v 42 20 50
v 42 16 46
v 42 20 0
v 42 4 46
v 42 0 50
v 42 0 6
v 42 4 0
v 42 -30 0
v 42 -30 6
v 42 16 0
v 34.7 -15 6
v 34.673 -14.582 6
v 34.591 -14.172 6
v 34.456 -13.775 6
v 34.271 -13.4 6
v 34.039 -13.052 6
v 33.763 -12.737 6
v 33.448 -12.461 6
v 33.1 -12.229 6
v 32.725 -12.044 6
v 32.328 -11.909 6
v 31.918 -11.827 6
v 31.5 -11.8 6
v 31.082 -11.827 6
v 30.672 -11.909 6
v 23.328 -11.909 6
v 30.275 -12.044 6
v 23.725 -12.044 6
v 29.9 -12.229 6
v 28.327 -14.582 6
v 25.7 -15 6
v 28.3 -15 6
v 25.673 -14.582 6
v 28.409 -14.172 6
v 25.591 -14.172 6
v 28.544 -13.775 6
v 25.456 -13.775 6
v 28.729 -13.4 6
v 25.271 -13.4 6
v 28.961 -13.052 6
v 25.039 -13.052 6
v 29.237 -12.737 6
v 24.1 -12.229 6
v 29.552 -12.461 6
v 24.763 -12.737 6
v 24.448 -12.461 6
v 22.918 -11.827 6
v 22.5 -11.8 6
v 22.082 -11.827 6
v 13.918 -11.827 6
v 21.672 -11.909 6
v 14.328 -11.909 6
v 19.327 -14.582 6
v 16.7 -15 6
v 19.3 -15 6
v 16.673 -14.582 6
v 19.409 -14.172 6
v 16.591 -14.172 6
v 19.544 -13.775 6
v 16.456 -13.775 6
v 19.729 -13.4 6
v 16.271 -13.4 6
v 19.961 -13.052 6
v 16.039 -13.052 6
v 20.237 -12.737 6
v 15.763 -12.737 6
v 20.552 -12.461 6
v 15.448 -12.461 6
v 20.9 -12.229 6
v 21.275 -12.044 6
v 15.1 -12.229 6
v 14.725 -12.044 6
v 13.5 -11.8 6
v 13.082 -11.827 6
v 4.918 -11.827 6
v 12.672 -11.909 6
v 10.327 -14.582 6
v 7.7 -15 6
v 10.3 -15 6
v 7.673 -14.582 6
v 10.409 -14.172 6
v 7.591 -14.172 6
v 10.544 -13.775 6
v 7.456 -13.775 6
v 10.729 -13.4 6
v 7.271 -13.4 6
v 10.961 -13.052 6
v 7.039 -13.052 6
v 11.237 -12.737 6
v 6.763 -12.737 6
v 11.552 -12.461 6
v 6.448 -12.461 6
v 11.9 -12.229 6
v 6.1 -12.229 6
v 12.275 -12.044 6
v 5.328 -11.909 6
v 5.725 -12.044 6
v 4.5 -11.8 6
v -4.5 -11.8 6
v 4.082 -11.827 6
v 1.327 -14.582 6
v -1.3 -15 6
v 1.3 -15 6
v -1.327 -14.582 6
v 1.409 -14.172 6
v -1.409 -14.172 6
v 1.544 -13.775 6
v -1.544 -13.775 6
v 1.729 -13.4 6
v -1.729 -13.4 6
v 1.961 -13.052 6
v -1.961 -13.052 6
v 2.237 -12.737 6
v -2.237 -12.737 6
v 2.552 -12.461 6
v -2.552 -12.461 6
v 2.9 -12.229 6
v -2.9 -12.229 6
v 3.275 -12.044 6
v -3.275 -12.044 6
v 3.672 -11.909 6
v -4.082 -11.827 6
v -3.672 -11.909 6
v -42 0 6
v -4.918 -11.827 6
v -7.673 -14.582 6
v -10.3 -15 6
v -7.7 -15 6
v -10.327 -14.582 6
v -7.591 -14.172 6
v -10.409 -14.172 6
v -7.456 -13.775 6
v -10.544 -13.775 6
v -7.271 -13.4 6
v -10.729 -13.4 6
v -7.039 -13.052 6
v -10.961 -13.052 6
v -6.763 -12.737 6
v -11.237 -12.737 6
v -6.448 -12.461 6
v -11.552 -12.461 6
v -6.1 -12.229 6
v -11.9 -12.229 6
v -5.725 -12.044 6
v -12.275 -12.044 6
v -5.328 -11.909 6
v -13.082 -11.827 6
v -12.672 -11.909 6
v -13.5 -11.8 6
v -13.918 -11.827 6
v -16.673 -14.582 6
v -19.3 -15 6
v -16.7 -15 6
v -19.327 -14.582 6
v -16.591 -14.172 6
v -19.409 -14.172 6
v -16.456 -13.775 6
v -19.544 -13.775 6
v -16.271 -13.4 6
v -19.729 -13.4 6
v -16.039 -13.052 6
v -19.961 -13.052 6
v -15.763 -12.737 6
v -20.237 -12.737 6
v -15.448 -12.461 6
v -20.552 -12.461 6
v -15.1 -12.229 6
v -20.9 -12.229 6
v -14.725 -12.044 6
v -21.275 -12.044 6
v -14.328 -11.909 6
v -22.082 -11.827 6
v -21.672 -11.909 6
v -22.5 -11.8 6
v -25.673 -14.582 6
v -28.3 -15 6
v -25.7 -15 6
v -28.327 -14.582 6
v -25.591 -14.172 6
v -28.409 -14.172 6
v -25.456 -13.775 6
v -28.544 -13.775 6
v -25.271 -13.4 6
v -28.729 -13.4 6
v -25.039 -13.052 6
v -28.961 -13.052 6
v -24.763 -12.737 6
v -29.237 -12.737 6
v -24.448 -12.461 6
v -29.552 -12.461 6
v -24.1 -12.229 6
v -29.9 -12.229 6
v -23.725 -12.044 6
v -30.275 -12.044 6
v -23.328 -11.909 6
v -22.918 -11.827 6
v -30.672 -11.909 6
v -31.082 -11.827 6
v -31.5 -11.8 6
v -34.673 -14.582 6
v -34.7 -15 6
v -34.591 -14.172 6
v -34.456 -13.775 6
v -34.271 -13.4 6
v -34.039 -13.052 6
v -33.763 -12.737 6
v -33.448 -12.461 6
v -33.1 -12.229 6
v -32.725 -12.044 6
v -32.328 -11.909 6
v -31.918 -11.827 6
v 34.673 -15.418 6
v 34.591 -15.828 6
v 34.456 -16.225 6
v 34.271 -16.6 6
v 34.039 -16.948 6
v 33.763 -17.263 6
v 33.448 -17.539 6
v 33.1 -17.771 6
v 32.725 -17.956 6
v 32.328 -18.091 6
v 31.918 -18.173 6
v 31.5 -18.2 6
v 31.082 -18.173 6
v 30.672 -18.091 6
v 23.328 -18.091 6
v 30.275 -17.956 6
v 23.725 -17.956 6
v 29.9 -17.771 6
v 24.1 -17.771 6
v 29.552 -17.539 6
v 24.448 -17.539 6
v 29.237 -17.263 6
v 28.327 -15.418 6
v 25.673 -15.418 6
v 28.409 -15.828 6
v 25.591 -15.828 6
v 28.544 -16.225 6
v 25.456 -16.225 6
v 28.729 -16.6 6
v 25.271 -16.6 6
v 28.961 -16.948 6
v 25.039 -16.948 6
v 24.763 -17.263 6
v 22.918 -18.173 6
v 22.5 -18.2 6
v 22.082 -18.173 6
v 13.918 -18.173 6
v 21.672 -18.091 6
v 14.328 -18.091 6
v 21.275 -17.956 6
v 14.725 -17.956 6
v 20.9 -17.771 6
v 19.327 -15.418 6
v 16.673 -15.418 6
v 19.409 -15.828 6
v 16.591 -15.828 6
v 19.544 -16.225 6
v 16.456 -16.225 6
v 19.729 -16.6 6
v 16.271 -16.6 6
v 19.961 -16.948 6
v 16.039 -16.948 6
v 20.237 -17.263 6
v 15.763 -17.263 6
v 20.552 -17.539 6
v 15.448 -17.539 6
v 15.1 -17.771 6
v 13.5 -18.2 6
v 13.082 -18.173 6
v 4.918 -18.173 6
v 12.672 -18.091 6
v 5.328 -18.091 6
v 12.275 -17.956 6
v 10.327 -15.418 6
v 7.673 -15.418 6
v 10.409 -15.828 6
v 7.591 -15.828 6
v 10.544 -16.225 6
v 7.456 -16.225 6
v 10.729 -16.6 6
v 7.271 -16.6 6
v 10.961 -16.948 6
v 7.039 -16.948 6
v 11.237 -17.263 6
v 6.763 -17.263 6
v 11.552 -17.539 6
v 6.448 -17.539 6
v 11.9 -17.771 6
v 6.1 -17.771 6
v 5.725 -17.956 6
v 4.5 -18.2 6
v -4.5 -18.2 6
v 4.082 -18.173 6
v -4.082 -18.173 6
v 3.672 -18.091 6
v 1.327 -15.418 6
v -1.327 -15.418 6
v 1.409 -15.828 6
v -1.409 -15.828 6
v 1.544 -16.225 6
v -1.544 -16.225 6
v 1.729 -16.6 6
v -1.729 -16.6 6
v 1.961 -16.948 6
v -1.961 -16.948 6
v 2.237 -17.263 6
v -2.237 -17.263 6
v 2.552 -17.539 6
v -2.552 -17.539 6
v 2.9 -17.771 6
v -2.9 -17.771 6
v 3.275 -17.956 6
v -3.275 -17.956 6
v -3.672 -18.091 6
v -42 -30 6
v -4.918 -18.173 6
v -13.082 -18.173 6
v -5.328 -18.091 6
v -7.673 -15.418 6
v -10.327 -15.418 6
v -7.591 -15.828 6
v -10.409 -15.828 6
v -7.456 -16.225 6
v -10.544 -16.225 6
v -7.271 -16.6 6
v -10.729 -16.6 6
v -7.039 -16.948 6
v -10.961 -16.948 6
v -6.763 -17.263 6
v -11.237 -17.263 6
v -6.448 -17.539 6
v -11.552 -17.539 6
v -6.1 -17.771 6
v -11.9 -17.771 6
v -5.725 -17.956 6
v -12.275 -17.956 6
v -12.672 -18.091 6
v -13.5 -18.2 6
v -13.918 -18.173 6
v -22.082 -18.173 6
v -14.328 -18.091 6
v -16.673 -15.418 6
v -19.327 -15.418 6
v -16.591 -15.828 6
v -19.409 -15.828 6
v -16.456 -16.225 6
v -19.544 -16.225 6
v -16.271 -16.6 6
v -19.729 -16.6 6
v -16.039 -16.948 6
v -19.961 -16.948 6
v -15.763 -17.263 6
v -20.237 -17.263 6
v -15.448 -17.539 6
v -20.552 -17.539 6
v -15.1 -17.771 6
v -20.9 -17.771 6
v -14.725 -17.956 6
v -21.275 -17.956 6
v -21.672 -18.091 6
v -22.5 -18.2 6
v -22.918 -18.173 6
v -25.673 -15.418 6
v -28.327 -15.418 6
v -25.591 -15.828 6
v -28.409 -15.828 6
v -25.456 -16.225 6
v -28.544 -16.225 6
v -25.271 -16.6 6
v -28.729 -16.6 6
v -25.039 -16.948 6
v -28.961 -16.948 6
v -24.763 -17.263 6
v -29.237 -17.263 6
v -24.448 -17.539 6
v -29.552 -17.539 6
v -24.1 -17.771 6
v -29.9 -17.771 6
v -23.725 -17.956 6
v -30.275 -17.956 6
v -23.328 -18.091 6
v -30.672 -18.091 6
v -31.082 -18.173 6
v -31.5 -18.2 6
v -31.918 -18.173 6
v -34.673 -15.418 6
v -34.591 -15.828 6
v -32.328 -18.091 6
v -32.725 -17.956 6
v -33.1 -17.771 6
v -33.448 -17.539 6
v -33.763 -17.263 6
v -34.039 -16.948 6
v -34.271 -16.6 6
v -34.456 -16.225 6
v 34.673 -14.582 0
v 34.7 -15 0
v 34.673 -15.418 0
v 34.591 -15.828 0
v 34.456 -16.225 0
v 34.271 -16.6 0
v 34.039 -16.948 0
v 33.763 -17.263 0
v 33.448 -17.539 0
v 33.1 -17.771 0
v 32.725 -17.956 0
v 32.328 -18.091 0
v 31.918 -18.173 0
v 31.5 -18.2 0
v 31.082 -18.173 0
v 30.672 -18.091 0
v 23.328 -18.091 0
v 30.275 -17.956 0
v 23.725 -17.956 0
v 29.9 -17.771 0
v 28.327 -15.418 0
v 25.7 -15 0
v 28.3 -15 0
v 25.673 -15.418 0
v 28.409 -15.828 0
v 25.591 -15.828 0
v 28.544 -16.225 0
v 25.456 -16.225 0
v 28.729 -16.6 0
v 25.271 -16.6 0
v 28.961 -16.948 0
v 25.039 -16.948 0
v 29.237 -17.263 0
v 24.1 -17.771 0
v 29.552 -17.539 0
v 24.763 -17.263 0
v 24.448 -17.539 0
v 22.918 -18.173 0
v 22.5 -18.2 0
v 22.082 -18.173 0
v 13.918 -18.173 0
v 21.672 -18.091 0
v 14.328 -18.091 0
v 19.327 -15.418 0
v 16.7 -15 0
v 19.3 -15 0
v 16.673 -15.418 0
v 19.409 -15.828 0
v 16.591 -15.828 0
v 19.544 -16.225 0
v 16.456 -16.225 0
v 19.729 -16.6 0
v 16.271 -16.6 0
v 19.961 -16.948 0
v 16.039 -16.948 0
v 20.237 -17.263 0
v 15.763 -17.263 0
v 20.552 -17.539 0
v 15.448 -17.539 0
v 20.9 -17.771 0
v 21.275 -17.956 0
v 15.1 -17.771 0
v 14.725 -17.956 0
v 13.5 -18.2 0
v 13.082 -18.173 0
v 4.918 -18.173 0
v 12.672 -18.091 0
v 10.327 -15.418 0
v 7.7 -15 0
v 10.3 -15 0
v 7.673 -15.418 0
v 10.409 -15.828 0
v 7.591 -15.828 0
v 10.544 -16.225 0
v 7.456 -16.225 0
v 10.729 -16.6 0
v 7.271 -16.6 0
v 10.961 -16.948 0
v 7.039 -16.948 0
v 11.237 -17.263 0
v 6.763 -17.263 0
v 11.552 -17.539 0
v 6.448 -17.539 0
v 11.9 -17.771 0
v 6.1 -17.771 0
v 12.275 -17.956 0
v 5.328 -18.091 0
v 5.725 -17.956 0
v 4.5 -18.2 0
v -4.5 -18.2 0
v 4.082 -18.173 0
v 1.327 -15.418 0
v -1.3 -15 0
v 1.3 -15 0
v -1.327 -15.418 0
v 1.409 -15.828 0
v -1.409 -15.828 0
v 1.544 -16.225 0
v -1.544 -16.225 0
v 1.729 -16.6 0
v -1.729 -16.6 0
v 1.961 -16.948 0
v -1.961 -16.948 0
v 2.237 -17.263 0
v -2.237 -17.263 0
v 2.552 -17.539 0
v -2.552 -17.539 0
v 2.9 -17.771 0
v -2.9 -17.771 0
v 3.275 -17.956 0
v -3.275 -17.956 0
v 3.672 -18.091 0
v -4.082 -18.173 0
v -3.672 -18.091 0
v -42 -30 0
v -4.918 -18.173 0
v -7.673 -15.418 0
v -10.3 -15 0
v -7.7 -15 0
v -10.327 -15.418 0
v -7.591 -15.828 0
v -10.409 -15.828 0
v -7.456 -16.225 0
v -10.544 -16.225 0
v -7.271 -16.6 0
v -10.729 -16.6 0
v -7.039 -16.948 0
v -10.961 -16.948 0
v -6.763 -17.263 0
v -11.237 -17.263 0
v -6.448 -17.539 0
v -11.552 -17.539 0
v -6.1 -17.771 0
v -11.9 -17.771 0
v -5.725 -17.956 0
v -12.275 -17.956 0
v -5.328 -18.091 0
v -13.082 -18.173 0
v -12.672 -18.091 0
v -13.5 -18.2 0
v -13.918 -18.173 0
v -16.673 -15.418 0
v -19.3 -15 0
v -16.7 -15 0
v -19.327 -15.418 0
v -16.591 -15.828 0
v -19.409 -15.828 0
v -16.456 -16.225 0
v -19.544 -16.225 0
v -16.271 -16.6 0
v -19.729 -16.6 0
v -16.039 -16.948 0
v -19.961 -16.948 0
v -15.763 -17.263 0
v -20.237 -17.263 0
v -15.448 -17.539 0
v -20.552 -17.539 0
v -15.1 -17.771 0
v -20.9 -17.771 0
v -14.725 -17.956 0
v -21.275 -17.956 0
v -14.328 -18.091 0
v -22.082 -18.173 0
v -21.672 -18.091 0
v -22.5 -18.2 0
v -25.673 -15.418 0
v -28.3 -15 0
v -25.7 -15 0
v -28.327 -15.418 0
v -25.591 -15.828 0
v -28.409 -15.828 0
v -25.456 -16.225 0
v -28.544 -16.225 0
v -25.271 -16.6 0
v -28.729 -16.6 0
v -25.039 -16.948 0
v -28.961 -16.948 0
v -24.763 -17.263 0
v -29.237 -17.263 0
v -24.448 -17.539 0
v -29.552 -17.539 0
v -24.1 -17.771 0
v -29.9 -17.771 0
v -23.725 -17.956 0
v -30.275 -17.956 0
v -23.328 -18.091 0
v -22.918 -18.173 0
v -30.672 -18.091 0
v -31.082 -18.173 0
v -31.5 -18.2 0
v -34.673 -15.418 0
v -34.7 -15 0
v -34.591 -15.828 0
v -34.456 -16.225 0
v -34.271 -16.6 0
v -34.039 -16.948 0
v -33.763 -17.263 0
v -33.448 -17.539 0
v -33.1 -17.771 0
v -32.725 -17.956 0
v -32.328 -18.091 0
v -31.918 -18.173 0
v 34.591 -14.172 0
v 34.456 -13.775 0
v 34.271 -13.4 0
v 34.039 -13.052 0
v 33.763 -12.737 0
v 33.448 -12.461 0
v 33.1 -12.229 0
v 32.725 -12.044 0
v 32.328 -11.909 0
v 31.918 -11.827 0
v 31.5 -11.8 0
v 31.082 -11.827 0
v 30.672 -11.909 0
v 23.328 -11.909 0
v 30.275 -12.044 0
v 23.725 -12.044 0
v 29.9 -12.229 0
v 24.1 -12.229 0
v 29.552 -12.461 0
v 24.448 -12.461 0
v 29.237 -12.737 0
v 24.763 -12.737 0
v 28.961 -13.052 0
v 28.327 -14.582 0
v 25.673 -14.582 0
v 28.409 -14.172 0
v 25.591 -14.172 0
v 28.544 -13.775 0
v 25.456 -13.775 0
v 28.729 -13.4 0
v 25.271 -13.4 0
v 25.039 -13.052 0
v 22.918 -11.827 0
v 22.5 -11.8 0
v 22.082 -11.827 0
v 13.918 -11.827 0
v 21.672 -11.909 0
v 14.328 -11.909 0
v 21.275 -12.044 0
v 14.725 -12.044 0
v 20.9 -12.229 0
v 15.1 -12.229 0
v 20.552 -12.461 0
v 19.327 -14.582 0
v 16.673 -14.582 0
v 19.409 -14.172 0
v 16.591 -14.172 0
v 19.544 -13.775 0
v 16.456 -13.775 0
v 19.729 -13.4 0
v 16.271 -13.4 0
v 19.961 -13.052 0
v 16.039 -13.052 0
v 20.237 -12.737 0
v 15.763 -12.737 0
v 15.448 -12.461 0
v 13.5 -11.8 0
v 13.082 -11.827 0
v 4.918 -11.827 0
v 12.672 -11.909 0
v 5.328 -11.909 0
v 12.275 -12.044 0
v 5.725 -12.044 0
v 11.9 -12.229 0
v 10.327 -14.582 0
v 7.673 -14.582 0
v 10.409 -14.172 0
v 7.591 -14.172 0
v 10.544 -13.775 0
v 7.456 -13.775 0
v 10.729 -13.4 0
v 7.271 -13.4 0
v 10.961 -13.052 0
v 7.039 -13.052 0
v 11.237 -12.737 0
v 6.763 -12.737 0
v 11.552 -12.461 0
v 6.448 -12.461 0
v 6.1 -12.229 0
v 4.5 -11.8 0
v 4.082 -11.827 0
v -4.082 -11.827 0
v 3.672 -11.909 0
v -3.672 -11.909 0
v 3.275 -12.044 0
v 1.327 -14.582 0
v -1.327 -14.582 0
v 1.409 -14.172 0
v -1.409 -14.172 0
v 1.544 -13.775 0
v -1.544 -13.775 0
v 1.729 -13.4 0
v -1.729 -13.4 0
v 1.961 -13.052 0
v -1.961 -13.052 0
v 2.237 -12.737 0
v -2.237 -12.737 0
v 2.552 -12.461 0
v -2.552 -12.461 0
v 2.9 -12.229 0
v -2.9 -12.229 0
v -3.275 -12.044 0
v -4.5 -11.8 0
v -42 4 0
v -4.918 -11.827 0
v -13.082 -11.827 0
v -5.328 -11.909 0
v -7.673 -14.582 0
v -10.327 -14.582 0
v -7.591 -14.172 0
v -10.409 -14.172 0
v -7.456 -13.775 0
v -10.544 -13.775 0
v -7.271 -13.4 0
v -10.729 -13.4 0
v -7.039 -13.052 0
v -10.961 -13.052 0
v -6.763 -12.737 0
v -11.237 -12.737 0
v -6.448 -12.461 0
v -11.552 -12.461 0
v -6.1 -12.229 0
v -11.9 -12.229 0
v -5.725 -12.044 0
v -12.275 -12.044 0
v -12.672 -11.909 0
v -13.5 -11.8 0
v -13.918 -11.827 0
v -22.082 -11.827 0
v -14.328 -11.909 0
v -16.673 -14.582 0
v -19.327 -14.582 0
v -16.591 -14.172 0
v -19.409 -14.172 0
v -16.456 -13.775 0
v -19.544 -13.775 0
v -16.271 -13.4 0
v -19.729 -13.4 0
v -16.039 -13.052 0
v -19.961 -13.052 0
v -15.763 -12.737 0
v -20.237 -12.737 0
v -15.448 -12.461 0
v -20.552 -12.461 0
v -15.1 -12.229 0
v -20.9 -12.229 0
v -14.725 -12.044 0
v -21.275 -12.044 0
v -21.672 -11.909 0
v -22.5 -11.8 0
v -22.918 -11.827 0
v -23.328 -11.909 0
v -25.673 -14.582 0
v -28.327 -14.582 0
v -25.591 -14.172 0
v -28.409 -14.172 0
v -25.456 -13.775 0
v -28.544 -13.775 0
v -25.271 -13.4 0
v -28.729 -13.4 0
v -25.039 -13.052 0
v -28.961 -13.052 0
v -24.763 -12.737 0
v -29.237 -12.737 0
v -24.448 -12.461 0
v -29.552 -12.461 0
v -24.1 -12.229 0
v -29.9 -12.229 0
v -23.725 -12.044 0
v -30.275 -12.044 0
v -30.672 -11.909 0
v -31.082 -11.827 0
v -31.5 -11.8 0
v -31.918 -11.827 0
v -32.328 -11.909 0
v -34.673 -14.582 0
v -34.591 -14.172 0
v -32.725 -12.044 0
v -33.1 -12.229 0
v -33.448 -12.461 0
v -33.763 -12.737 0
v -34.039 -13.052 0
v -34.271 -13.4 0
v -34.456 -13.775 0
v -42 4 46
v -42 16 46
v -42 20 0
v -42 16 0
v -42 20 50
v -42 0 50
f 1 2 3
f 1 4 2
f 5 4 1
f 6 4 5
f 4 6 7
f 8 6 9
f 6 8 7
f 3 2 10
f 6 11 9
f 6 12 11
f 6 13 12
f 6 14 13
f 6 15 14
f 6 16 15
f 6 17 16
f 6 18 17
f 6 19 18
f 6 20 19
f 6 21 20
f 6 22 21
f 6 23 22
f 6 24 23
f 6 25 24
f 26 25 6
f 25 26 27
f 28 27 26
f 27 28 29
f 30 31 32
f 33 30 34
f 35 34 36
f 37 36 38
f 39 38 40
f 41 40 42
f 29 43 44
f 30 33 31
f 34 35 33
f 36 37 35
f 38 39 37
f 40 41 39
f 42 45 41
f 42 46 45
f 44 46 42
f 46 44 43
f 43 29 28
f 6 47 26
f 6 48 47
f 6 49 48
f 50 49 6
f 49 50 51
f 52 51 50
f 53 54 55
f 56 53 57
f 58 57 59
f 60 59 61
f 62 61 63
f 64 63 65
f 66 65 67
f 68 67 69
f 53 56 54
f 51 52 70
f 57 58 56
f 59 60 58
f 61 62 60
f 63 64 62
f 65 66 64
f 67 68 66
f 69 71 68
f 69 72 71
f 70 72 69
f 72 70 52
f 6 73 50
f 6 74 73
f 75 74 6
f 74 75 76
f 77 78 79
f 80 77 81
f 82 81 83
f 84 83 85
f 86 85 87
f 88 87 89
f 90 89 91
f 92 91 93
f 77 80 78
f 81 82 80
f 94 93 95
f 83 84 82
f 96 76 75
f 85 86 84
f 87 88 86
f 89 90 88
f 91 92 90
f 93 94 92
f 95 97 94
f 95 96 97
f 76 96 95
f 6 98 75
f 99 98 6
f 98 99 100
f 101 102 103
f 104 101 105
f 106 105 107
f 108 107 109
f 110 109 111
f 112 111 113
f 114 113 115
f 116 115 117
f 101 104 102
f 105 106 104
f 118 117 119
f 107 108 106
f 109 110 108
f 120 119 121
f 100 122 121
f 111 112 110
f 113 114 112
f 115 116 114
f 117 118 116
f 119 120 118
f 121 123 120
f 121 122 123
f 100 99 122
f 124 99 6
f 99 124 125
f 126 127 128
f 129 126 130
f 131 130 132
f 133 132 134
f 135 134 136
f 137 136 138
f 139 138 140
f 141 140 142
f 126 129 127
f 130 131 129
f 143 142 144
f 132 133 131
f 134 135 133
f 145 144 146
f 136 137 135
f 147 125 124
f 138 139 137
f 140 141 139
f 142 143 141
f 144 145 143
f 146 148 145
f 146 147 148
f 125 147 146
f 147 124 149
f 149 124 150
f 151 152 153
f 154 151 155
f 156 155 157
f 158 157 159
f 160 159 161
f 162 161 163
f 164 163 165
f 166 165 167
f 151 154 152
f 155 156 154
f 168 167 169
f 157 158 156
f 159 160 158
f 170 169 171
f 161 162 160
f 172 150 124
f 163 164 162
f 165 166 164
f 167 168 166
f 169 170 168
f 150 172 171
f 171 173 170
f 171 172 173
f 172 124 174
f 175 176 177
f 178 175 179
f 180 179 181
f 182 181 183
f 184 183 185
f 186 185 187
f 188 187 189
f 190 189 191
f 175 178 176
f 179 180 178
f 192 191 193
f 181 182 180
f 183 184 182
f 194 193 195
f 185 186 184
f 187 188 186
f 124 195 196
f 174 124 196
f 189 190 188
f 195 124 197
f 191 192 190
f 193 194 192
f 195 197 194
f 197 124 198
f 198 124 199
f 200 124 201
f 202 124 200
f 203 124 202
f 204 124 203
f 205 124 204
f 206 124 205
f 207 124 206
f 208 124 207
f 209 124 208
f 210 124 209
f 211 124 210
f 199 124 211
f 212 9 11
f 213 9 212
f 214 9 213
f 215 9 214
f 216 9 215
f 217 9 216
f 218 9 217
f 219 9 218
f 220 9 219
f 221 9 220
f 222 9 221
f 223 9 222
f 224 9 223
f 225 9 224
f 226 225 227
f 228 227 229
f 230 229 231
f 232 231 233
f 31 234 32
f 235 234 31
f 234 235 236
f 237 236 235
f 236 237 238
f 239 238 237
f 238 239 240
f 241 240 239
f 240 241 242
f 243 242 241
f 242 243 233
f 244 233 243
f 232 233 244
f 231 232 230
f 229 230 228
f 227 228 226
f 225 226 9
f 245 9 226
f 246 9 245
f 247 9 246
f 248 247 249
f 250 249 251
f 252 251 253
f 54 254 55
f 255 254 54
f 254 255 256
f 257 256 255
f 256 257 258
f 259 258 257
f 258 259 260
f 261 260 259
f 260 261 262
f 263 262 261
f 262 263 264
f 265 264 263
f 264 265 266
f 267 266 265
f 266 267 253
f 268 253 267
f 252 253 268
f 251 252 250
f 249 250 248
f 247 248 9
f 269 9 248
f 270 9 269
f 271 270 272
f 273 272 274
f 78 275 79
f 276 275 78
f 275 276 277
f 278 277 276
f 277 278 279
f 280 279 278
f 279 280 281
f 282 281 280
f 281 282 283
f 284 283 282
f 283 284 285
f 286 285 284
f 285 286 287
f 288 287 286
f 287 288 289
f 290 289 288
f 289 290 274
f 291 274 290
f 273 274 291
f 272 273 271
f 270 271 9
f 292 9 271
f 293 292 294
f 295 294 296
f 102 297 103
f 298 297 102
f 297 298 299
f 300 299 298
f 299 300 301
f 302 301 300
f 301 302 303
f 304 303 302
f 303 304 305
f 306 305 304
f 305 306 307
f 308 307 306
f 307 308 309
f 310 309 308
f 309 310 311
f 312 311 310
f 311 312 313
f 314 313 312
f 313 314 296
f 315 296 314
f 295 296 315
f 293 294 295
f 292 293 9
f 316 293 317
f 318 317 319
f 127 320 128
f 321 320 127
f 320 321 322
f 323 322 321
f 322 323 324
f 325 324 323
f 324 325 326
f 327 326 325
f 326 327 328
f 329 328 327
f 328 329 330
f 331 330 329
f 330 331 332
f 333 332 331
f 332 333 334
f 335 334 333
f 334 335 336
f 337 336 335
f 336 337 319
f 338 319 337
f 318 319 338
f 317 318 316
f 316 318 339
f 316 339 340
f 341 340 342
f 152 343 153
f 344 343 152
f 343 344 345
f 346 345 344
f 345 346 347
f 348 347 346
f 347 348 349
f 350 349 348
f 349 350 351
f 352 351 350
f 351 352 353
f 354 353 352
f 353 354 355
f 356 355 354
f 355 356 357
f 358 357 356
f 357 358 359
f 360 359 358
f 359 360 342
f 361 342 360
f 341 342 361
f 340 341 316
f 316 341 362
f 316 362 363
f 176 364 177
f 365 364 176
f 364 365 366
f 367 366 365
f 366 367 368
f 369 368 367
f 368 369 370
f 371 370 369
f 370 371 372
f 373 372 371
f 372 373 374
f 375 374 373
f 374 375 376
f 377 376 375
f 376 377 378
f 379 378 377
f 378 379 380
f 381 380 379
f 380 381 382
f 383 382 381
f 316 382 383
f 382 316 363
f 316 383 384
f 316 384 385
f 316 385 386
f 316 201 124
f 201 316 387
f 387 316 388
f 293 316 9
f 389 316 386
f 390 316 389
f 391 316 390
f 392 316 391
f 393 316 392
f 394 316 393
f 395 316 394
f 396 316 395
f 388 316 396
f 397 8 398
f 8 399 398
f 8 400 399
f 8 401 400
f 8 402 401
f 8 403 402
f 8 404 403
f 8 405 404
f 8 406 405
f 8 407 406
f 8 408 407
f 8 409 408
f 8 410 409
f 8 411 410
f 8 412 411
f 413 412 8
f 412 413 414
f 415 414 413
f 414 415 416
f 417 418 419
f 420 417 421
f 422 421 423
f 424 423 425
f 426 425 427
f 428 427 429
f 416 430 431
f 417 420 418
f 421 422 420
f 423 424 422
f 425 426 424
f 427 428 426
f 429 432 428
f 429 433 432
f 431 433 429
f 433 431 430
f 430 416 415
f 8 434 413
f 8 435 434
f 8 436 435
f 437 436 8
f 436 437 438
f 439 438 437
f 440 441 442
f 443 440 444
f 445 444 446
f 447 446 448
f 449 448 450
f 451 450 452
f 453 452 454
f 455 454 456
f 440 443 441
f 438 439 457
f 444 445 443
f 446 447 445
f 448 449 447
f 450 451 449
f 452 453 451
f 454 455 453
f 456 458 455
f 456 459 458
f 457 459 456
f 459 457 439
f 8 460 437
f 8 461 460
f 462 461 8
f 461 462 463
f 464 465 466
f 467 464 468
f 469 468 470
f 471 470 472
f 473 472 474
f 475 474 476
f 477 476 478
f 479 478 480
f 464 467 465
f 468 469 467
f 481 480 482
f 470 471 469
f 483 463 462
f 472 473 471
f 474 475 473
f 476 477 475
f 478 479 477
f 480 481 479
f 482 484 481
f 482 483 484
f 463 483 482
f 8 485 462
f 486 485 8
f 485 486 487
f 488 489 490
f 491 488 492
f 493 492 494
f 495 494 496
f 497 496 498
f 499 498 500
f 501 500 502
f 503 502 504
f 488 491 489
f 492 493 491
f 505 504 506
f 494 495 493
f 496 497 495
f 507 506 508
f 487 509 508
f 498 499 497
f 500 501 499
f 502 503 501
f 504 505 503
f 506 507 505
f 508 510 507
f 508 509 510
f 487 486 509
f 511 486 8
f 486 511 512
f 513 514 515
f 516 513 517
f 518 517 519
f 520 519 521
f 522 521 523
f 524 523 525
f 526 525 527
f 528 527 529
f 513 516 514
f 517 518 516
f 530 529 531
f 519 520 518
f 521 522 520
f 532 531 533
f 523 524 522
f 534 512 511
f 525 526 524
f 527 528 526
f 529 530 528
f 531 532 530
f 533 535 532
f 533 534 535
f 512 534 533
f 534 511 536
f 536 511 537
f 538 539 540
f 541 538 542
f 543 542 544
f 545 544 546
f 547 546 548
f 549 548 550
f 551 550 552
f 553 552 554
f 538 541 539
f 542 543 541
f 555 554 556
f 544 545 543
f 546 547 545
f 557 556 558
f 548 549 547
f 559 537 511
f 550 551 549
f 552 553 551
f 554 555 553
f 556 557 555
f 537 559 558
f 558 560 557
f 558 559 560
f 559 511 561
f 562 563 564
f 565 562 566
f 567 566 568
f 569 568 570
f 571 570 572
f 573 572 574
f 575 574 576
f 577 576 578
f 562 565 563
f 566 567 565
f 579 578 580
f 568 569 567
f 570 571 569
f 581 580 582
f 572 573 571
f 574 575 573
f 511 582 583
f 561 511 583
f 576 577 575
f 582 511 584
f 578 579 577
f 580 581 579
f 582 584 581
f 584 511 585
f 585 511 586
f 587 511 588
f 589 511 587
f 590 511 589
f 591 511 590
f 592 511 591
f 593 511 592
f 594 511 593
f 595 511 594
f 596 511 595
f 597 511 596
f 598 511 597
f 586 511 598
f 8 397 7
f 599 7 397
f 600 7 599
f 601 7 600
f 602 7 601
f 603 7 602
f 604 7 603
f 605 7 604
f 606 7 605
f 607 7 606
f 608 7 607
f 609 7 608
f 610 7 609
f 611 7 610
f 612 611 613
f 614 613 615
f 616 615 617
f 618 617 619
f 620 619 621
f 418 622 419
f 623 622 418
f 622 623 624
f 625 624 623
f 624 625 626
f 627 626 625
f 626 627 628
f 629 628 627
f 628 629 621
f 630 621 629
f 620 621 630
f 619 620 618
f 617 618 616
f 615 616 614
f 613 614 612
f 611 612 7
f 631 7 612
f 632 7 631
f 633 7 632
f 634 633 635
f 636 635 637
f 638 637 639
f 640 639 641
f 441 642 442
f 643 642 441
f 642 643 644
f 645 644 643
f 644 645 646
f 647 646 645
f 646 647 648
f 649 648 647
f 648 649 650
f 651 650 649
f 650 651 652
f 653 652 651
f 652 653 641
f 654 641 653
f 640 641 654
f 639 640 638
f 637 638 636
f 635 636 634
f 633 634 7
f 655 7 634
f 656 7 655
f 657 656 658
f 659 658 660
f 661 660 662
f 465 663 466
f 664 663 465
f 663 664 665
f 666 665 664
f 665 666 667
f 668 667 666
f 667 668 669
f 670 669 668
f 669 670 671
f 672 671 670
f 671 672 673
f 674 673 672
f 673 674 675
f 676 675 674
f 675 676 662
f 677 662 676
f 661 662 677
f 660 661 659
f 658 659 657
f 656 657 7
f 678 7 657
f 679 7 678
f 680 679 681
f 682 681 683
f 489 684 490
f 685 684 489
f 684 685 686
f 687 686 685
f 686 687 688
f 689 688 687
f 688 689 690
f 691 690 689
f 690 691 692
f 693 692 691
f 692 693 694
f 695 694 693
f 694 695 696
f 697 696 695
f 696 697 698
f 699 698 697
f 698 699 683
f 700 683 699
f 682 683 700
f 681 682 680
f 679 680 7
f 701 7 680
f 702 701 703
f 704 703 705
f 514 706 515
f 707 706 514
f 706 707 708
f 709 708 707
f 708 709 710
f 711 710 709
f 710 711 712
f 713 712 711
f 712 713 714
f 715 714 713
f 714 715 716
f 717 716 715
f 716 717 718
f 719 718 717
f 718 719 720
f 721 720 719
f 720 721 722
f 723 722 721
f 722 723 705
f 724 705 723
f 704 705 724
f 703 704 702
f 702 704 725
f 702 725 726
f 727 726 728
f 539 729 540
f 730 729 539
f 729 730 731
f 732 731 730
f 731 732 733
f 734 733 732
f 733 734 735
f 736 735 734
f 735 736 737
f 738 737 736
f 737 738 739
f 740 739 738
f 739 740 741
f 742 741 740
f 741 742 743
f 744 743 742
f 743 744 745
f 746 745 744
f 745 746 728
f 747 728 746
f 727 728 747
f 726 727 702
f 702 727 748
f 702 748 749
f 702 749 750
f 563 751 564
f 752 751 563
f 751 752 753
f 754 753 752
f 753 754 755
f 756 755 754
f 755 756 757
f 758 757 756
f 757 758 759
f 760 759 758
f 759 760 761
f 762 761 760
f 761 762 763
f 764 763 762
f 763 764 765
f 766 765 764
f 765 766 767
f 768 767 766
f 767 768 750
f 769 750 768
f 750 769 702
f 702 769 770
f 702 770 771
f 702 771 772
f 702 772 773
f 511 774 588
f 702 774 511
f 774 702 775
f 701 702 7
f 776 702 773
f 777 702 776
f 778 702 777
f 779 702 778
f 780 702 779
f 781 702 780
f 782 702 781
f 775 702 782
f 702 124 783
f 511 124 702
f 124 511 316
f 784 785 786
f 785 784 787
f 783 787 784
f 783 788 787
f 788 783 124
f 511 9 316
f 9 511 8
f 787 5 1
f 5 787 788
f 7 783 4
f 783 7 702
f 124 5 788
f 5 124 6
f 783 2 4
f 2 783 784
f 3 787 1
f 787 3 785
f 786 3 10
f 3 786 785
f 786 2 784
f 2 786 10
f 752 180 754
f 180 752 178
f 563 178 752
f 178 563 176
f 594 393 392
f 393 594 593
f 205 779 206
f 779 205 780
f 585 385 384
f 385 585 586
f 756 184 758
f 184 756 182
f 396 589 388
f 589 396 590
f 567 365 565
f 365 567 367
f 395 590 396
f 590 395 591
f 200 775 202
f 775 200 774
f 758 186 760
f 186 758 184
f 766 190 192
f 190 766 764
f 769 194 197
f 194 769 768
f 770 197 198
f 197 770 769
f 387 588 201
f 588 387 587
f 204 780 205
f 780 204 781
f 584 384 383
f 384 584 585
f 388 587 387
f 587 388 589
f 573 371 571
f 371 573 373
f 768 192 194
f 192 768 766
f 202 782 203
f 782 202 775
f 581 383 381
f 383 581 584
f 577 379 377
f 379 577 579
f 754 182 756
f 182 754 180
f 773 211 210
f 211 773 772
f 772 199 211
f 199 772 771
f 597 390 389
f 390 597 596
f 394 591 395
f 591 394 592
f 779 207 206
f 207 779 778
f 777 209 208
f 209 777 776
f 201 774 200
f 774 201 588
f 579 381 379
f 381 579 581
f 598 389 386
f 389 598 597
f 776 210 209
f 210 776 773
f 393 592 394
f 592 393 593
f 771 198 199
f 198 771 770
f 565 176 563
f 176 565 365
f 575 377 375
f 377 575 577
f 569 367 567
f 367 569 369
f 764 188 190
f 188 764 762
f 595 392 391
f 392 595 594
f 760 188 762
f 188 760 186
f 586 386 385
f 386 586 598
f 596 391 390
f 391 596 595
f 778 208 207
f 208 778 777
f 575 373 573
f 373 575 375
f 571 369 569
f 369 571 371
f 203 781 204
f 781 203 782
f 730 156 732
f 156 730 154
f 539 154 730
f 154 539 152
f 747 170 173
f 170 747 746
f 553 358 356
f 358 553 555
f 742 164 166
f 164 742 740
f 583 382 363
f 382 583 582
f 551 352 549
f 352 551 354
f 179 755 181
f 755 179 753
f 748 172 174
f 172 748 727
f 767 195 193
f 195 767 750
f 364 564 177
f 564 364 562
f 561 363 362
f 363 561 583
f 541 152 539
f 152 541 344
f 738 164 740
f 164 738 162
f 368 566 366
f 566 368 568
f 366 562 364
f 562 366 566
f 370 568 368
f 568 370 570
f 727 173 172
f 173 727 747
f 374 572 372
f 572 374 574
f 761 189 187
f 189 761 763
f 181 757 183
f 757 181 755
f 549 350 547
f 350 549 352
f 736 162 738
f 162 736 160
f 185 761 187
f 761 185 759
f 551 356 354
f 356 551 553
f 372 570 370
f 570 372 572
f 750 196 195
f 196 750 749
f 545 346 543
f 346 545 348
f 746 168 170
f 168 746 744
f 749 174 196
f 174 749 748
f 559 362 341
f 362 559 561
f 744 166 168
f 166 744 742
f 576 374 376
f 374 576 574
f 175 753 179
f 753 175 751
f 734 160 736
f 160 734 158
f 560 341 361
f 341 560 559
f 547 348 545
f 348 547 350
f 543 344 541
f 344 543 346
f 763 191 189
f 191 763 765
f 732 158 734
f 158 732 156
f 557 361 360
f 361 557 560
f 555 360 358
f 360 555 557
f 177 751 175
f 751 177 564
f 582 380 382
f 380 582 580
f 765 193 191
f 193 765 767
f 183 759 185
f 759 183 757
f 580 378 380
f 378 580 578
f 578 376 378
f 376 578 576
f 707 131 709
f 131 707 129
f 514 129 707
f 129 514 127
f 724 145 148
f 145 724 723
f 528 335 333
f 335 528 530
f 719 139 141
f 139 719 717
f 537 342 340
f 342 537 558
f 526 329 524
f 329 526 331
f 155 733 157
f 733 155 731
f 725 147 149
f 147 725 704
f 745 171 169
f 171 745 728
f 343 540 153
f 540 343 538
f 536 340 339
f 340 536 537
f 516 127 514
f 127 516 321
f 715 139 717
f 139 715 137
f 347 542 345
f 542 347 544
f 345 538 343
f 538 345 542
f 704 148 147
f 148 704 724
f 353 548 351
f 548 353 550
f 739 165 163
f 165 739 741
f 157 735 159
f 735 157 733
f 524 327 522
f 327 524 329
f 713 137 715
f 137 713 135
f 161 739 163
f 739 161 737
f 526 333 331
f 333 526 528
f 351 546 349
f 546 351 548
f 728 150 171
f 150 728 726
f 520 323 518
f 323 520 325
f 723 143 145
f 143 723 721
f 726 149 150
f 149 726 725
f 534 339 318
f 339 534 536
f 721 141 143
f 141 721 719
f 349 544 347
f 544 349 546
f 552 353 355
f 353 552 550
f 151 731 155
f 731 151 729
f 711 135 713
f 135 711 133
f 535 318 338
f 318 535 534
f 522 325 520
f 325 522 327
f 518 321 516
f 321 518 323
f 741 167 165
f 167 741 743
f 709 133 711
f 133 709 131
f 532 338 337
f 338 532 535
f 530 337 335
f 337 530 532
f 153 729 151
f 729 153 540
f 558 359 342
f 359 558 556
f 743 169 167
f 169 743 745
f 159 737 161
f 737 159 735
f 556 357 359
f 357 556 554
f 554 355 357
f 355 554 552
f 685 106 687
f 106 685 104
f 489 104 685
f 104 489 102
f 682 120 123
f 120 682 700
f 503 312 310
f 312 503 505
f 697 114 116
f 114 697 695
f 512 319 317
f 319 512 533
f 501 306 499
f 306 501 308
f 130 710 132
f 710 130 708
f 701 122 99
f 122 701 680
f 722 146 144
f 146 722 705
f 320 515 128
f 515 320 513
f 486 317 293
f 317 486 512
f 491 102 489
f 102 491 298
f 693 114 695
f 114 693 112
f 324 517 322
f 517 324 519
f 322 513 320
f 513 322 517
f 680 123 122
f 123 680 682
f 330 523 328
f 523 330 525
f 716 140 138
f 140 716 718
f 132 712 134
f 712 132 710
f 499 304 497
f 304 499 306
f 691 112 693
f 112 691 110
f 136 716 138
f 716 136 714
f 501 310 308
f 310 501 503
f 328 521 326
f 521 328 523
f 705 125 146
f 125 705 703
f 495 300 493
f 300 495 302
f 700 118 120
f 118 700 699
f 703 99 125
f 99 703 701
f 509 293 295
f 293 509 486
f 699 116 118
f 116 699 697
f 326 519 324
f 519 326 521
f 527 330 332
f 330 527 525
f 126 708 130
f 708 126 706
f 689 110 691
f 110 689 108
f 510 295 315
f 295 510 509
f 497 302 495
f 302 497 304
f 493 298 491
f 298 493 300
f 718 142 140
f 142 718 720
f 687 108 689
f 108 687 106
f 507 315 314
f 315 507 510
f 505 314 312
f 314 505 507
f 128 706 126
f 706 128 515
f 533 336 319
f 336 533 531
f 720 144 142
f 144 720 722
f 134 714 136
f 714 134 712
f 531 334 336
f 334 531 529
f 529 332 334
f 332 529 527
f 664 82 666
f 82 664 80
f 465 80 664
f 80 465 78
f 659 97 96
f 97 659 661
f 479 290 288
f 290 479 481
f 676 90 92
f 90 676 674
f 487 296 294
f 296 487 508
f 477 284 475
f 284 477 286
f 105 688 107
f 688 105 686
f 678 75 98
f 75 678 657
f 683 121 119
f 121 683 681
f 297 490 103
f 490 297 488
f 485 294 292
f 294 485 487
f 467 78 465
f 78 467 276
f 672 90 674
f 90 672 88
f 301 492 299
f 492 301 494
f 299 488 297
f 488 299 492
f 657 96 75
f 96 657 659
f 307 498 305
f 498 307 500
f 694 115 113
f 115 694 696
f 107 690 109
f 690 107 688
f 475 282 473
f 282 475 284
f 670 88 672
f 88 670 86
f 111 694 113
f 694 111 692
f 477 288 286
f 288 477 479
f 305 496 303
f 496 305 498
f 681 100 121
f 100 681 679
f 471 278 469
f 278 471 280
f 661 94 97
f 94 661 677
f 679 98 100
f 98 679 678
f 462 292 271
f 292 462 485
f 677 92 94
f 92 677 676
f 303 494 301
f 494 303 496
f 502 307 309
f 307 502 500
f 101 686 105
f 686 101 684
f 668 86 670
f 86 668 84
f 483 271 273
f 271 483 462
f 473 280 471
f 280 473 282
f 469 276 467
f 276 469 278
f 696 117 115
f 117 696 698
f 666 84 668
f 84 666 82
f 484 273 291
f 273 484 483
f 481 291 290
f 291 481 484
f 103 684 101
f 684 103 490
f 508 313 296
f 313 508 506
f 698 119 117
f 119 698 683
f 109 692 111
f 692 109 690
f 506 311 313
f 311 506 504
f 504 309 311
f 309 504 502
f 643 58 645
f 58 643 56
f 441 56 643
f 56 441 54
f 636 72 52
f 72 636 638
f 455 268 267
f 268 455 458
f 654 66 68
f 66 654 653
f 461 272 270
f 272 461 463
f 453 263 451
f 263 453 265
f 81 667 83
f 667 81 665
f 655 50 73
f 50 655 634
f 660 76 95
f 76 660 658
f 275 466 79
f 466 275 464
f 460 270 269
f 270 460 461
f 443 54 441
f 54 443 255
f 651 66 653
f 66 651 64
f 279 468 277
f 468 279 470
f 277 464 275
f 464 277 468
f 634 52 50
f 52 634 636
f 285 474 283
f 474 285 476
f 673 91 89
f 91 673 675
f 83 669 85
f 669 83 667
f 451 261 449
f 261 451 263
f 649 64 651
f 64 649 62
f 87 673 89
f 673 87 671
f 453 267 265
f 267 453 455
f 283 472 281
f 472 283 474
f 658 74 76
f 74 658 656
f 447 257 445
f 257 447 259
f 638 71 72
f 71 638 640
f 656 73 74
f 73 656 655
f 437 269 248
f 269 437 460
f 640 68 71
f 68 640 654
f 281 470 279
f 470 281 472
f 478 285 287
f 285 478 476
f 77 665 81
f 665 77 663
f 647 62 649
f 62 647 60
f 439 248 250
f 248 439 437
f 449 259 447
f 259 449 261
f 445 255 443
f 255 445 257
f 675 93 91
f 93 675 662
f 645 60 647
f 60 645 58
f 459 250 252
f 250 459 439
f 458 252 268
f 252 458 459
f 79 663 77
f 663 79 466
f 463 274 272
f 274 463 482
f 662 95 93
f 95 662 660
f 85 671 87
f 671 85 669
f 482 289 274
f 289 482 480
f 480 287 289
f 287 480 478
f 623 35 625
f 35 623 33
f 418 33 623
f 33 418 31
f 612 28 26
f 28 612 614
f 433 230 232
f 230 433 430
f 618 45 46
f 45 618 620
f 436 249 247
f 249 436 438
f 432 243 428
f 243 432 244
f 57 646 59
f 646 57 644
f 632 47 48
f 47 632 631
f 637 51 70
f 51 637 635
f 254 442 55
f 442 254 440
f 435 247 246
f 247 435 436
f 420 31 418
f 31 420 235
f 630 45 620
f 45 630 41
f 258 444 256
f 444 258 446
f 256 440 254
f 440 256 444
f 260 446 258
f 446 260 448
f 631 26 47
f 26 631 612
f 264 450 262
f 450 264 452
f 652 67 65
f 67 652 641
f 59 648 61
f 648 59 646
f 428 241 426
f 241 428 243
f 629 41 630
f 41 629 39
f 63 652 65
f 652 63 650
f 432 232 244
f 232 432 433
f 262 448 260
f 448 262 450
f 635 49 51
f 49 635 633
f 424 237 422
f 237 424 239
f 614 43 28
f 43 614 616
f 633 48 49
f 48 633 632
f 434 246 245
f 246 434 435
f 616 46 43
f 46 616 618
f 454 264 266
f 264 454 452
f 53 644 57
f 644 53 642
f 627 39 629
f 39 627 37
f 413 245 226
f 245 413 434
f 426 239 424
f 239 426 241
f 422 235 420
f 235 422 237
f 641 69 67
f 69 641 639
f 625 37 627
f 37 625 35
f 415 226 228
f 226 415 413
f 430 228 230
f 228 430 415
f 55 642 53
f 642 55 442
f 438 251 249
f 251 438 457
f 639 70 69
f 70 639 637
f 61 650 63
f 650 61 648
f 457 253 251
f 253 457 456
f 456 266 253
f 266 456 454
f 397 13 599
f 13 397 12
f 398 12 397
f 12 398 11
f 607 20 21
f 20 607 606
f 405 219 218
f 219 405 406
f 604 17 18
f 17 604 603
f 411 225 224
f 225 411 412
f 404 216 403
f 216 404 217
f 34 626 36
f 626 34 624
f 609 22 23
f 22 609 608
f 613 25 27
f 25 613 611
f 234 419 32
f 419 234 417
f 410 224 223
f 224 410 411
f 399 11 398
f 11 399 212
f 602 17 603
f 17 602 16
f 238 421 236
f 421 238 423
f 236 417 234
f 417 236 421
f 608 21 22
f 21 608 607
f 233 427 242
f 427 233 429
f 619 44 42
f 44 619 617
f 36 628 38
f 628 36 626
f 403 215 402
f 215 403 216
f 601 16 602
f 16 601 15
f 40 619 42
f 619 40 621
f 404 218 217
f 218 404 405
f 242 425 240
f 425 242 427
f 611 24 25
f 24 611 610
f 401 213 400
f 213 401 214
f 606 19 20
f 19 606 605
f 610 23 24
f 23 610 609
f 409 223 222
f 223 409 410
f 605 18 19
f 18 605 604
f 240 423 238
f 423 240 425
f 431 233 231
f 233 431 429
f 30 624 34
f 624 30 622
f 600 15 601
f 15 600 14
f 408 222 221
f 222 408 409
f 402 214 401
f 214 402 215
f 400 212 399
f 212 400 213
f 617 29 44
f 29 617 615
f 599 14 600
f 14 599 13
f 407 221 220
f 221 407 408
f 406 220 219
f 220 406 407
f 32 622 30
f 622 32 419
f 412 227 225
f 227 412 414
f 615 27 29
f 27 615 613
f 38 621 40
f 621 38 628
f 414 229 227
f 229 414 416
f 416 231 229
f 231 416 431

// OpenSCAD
// KNOWN-WRONG PART (must fail): the wall gap is 12 mm (no clearance) instead of 12.5
// Holder that hangs one 8-tube PCR strip inside an ice bucket, hooked over its 12 mm wall
// Category: quick fixes. An upside-down U (two legs and a bridge) that fits over the wall, and a
// ledge at the foot of the inner leg with eight tube holes, so the tubes sit down in the ice.
// Print: PLA or PETG, as used (both legs and the ledge on the bed); the bridge spans 12.5 mm.
// SPDX-License-Identifier: CERN-OHL-P-2.0

/* [Hanger] */
length = 84;              // along X, centred
leg_t = 4;
gap = 12;                 // 12 mm bucket wall + clearance
leg_h = 50;               // both legs from z = 0 to 50
bridge_t = 4;             // bridge from z = 46 to 50
ledge = [30, 6];          // ledge reaches 30 mm toward -Y, 6 mm thick
hole_d = 6.4;
n = 8;
pitch = 9;
hole_y = -15;

/* [Hidden] */
eps = 0.01;
outer_y = leg_t + gap;    // outer leg from y = 16.5 to 20.5

difference() {
    union() {
        translate([-length / 2, -ledge[0], 0]) cube([length, ledge[0] + eps, ledge[1]]);
        translate([-length / 2, 0, 0]) cube([length, leg_t, leg_h]);
        translate([-length / 2, 0, leg_h - bridge_t]) cube([length, outer_y + leg_t, bridge_t]);
        translate([-length / 2, outer_y, 0]) cube([length, leg_t, leg_h]);
    }
    for (i = [0 : n - 1])
        translate([(i - (n - 1) / 2) * pitch, hole_y, -1]) cylinder(d = hole_d, h = ledge[1] + 2, $fn = 48);
}
